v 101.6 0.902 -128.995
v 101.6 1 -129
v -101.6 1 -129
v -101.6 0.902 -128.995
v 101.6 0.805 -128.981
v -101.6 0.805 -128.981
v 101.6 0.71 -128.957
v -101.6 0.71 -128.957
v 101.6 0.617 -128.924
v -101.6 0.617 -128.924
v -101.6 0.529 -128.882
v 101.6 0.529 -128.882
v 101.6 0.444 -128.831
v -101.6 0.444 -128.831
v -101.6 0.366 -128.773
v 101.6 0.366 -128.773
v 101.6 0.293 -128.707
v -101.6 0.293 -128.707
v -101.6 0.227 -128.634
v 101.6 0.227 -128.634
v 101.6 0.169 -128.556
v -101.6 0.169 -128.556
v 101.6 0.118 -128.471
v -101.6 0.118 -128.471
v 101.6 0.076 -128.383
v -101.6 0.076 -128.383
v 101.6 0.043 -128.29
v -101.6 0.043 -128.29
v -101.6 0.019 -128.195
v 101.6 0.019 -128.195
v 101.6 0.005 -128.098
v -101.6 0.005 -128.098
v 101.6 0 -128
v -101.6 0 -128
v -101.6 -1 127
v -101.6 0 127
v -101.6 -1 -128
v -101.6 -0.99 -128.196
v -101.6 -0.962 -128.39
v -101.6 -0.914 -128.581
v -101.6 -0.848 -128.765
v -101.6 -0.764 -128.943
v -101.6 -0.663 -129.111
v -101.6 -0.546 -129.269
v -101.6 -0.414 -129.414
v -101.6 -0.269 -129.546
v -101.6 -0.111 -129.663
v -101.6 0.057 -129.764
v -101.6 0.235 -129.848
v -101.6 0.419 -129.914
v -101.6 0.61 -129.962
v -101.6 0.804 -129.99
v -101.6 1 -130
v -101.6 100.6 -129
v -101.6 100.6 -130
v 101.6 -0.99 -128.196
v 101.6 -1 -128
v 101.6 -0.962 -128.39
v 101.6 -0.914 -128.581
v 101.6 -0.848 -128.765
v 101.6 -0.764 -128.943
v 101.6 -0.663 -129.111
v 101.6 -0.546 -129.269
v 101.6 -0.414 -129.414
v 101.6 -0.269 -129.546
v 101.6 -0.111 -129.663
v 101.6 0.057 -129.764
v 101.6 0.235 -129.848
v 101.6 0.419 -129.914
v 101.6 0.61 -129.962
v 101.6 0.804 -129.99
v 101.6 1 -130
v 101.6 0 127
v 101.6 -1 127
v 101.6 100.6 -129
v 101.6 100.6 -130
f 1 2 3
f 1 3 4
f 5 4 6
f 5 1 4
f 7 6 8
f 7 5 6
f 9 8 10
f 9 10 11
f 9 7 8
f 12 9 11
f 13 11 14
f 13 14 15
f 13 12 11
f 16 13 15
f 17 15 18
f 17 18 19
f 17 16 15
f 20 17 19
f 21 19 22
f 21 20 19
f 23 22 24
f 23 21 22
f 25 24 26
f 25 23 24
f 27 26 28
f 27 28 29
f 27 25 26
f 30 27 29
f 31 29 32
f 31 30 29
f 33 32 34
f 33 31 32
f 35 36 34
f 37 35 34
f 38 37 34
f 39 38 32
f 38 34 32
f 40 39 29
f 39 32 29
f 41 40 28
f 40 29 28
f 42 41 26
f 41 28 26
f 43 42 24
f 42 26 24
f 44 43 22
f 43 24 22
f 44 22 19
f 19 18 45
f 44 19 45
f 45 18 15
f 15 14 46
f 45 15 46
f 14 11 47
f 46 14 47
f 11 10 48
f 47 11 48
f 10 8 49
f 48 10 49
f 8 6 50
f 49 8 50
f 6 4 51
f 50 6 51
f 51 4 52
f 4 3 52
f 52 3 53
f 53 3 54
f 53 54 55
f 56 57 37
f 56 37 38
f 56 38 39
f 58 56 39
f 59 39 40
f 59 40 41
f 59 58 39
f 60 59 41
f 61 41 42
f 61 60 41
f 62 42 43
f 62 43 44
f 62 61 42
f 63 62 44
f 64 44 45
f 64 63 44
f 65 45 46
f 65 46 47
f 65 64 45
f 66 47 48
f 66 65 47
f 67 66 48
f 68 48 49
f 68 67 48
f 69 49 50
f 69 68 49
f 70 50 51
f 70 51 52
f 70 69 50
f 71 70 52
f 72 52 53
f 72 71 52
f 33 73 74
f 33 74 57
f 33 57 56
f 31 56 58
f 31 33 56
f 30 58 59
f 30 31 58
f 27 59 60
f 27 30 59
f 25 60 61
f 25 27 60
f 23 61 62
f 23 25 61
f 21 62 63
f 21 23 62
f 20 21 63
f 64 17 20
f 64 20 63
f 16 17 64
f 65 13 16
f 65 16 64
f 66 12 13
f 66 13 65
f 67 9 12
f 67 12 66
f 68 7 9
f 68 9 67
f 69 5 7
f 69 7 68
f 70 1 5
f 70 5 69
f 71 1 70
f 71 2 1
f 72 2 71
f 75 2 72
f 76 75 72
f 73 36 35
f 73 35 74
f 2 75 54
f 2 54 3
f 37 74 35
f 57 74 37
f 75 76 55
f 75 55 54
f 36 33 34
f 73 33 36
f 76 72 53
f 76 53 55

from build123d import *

# Parameters (mm, degrees)
SKETCH1_W          = 203.2
SKETCH1_H          = 254
BASE_FLANGE1_DEPTH = 1
EDGE_FLANGE1_DEPTH = 203.2


# Sheet-metal steps are written as plain solids
with BuildPart() as part:
    # Sketch1 → Base-Flange1 (new body)
    with BuildSketch(Plane(origin=(0, 0, 0), x_dir=(1, 0, 0), z_dir=(0, 1, 0))):
        Rectangle(SKETCH1_W, SKETCH1_H)
    extrude(amount=-BASE_FLANGE1_DEPTH)

    # Edge-Flange1 section (across the edge) → Edge-Flange1 (add)
    with BuildSketch(Plane(origin=(101.6, 0, -130), x_dir=(0, 0, 1), z_dir=(-1, 0, 0))):
        with BuildLine():
            Line((0, 1), (0, 100.6))
            Line((0, 100.6), (1, 100.6))
            Line((1, 100.6), (1, 1))
            ThreePointArc((1, 1), (1.292893219, 0.292893219), (2, 0))
            Line((2, 0), (3, 0))
            Line((3, 0), (3, -1))
            Line((3, -1), (2, -1))
            ThreePointArc((2, -1), (0.585786438, -0.414213562), (0, 1))
        make_face()
    extrude(amount=EDGE_FLANGE1_DEPTH)


solid = part.part
